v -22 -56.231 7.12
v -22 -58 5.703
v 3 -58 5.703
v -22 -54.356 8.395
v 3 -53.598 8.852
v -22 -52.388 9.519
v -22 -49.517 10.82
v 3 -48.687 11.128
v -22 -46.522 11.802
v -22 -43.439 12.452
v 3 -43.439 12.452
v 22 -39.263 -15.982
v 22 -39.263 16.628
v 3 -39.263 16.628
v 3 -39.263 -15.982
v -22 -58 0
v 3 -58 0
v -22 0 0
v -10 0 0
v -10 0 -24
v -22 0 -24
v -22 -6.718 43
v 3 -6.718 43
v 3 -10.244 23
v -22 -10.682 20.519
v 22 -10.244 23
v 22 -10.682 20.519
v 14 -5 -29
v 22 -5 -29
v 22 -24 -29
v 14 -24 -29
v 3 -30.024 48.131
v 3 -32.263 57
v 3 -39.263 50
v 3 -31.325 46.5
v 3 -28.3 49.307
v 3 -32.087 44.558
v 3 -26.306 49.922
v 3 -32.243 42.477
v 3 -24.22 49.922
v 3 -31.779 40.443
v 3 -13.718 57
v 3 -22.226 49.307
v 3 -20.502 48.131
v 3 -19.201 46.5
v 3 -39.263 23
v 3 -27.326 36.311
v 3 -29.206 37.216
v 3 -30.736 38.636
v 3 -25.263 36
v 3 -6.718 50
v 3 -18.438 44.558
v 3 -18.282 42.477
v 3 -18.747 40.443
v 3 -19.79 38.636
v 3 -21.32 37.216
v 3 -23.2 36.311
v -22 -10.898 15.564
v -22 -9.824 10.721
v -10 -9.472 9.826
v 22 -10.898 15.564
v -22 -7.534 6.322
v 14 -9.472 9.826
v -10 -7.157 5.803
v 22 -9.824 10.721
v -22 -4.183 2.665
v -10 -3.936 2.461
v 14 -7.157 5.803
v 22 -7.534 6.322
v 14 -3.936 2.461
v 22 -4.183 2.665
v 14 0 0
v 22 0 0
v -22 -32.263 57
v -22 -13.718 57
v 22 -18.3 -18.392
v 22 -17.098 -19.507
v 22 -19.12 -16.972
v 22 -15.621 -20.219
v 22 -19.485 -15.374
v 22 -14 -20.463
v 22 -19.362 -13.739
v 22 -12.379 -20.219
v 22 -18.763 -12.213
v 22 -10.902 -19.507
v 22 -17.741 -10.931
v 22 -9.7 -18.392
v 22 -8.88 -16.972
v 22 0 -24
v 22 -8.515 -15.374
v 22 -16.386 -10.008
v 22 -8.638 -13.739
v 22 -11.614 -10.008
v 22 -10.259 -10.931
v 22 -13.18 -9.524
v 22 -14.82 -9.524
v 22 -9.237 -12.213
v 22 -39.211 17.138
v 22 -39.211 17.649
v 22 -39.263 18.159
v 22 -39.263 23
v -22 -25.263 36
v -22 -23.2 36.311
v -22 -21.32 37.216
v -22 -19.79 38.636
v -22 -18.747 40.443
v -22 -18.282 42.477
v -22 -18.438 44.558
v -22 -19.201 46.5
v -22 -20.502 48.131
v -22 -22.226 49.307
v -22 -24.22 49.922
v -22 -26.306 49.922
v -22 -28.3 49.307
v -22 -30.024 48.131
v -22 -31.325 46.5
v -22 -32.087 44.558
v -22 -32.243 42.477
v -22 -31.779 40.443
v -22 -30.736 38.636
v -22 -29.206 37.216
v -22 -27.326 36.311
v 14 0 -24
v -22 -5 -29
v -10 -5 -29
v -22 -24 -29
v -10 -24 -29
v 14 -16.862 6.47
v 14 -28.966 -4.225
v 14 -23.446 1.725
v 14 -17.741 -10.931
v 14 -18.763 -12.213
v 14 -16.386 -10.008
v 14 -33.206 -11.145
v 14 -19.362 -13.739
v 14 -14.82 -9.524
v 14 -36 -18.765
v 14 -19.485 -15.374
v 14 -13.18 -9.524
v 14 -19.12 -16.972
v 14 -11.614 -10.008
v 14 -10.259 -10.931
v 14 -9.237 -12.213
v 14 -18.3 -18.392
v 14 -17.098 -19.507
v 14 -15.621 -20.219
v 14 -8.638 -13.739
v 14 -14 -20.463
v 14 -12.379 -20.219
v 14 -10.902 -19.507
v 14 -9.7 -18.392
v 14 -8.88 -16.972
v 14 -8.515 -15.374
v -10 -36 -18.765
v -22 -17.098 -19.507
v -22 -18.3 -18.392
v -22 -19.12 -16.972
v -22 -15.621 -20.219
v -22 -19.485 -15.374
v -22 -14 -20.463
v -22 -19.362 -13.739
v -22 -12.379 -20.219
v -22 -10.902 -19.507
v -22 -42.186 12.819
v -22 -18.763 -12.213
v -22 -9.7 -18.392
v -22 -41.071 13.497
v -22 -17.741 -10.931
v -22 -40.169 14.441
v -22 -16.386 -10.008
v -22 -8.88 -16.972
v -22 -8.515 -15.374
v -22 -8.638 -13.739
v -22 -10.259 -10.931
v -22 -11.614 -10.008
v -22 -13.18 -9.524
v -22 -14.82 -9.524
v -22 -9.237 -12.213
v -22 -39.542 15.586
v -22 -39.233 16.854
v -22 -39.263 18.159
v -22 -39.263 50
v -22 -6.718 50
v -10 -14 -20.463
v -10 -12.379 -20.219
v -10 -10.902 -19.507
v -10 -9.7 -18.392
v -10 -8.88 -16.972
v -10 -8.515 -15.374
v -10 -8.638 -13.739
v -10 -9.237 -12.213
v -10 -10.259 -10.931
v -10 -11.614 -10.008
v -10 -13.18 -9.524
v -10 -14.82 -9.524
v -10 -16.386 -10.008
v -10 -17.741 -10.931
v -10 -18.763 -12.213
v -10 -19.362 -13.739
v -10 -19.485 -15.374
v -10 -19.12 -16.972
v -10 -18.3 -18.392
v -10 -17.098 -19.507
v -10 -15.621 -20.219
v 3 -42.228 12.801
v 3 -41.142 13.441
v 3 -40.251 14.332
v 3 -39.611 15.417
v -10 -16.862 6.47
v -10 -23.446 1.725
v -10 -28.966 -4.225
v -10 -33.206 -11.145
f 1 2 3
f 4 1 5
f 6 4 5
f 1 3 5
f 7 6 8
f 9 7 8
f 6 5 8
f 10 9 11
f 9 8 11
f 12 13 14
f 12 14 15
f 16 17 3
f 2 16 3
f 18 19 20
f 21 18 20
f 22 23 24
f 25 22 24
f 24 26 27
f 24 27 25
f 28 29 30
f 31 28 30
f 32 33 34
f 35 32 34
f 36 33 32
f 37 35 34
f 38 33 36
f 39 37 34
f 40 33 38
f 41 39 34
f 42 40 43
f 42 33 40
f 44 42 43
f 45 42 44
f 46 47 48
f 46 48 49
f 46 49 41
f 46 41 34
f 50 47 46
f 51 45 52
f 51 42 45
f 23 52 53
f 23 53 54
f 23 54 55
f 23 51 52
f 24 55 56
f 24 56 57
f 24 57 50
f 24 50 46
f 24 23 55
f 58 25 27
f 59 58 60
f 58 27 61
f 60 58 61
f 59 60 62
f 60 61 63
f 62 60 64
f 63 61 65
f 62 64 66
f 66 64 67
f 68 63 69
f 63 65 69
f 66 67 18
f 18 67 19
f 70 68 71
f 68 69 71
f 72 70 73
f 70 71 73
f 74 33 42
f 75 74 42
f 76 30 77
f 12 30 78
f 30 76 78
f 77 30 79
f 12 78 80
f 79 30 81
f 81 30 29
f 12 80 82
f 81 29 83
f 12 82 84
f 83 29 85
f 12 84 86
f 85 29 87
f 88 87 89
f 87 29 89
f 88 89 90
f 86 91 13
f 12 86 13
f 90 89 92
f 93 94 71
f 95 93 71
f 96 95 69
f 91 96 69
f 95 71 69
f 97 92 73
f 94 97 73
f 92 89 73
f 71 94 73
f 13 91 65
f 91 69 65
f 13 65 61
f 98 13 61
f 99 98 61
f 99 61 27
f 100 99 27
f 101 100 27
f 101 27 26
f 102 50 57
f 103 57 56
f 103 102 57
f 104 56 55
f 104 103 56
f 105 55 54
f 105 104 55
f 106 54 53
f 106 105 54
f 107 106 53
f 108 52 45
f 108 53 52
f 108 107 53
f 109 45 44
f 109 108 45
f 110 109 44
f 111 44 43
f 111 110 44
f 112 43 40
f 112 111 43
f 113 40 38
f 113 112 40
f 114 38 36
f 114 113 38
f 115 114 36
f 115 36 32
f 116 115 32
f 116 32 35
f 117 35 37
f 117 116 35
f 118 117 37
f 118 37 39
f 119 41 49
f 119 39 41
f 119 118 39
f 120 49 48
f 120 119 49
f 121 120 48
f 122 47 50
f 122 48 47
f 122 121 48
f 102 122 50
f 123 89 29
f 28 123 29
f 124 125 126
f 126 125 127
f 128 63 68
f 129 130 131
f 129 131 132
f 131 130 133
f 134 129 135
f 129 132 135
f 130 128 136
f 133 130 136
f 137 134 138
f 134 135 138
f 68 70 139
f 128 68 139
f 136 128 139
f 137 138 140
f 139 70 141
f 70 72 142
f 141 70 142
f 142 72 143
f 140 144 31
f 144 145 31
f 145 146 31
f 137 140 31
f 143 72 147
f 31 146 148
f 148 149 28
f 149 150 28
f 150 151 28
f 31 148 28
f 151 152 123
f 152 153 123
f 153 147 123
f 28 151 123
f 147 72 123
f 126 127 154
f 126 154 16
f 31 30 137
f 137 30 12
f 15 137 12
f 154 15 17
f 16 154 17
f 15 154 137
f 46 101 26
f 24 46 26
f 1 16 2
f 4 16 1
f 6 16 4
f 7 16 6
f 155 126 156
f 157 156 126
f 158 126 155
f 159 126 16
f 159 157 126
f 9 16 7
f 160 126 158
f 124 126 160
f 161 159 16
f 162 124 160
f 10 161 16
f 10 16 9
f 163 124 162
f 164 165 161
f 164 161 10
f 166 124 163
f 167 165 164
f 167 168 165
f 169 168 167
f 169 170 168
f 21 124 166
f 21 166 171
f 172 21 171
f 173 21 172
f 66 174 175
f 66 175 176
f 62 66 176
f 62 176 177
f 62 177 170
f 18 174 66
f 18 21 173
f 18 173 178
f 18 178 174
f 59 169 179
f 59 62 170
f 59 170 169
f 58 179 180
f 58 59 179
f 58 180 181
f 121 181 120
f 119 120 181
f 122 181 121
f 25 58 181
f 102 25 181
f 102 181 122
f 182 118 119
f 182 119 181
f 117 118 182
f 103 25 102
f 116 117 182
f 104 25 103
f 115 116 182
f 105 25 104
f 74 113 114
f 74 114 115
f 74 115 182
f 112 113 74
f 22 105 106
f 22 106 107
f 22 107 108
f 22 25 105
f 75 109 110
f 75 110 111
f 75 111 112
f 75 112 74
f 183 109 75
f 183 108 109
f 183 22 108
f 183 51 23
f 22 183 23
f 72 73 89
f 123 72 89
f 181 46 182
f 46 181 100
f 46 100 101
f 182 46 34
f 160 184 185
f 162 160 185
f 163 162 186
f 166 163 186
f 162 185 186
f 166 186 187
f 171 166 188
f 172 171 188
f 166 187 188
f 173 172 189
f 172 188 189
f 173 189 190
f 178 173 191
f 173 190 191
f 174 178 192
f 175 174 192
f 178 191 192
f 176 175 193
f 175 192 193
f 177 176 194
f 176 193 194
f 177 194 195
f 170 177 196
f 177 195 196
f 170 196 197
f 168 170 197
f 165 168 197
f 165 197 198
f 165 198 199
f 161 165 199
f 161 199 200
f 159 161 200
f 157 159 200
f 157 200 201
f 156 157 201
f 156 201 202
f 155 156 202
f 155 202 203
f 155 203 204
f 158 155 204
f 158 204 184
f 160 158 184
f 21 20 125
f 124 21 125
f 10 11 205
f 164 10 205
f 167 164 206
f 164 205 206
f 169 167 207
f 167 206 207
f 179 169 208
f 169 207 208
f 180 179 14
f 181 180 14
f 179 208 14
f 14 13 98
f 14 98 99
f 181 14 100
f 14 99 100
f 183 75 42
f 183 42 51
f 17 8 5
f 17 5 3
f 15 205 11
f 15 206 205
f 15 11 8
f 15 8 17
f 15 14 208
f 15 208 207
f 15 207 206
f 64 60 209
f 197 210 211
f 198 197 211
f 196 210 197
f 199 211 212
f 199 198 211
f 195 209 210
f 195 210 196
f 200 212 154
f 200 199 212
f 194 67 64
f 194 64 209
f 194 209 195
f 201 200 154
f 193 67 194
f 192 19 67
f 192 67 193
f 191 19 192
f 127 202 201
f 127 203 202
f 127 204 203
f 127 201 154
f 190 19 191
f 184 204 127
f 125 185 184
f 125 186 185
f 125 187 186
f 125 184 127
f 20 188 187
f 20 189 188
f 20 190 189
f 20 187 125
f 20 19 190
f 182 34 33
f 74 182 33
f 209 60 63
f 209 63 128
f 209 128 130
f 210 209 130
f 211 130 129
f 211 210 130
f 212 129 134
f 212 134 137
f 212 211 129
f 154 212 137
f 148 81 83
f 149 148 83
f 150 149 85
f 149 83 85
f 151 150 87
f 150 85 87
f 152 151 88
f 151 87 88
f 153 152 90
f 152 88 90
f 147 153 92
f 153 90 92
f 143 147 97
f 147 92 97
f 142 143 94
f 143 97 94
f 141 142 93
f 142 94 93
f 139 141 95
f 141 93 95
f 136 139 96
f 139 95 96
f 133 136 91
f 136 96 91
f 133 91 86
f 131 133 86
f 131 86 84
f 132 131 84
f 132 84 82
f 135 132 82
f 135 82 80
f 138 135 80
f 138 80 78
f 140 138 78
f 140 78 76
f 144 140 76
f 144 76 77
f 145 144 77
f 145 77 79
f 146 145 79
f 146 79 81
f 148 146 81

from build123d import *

# Parameters (mm, degrees)
SKETCH1_R               = 7
BOSS_EXTRUDE3_DEPTH     = 22
SKETCH8_R               = 5.5
CUT_EXTRUDE1_DEPTH      = 46
SKETCH10_W              = 34.059077951
SKETCH10_H              = 32.597107019
CUT_EXTRUDE2_DEPTH      = 19
SKETCH19_R              = 41
CUT_EXTRUDE5_DEPTH      = 14
CUT_EXTRUDE5_DEPTH_BACK = 10
SKETCH21_W              = 39.040087977
SKETCH21_H              = 19
CUT_EXTRUDE7_DEPTH      = 19


with BuildPart() as part:
    # Sketch1 → Boss-Extrude3 (new body, symmetric)
    with BuildSketch(Plane(origin=(0, 0, 0), x_dir=(0, 0, -1), z_dir=(1, 0, 0))):
        with BuildLine():
            Line((0, 0), (24, 0))
            Line((24, 0), (29, -5))
            Line((29, -5), (29, -24))
            Line((29, -24), (0, -58))
            Line((0, -58), (-5.703019947, -58))
            ThreePointArc((-5.703019947, -58), (-7.775768892, -55.305839554), (-9.519025669, -52.387647562))
            ThreePointArc((-9.519025669, -52.387647562), (-11.35140658, -48.033040831), (-12.452414435, -43.438696342))
            ThreePointArc((-12.452414435, -43.438696342), (-14.440768413, -40.168970146), (-18.158792561, -39.262903161))
            Line((-18.158792561, -39.262903161), (-50, -39.262903161))
            Line((-50, -39.262903161), (-57, -32.262903161))
            Line((-57, -32.262903161), (-57, -13.71762228))
            Line((-57, -13.71762228), (-50, -6.71762228))
            Line((-50, -6.71762228), (-43, -6.71762228))
            Line((-43, -6.71762228), (-20.519163329, -10.681600334))
            ThreePointArc((-20.519163329, -10.681600334), (-8.446624302, -8.823458857), (0, 0))
        make_face()
        with Locations((-43, -25.262903161)):
            Circle(SKETCH1_R, mode=Mode.SUBTRACT)
    extrude(amount=BOSS_EXTRUDE3_DEPTH, both=True)

    # Sketch8 → Cut-Extrude1 (cut)
    with BuildSketch(Plane(origin=(22, 0, 0), x_dir=(0, 0, -1), z_dir=(1, 0, 0))):
        with Locations((14.962850045, -14)):
            Circle(SKETCH8_R)
    extrude(amount=-CUT_EXTRUDE1_DEPTH, mode=Mode.SUBTRACT)

    # Sketch10 → Cut-Extrude2 (cut)
    with BuildSketch(Plane(origin=(22, 0, 0), x_dir=(0, 0, -1), z_dir=(1, 0, 0))):
        with Locations((-40.029538976, -22.964349652)):
            Rectangle(SKETCH10_W, SKETCH10_H)
    extrude(amount=-CUT_EXTRUDE2_DEPTH, mode=Mode.SUBTRACT)

    # Sketch19 → Cut-Extrude5 (cut, two sides)
    with BuildSketch(Plane(origin=(0, 0, 0), x_dir=(0, 0, -1), z_dir=(1, 0, 0))) as cut_extrude5_sk:
        with Locations((29, 3.701873436)):
            Circle(SKETCH19_R)
    extrude(amount=CUT_EXTRUDE5_DEPTH, mode=Mode.SUBTRACT)
    extrude(cut_extrude5_sk.sketch, amount=-CUT_EXTRUDE5_DEPTH_BACK, mode=Mode.SUBTRACT)

    # Sketch21 → Cut-Extrude7 (cut)
    with BuildSketch(Plane(origin=(22, 0, 0), x_dir=(0, 0, -1), z_dir=(1, 0, 0))):
        with Locations((-3.479956011, -48.762903161)):
            Rectangle(SKETCH21_W, SKETCH21_H)
    extrude(amount=-CUT_EXTRUDE7_DEPTH, mode=Mode.SUBTRACT)


solid = part.part
